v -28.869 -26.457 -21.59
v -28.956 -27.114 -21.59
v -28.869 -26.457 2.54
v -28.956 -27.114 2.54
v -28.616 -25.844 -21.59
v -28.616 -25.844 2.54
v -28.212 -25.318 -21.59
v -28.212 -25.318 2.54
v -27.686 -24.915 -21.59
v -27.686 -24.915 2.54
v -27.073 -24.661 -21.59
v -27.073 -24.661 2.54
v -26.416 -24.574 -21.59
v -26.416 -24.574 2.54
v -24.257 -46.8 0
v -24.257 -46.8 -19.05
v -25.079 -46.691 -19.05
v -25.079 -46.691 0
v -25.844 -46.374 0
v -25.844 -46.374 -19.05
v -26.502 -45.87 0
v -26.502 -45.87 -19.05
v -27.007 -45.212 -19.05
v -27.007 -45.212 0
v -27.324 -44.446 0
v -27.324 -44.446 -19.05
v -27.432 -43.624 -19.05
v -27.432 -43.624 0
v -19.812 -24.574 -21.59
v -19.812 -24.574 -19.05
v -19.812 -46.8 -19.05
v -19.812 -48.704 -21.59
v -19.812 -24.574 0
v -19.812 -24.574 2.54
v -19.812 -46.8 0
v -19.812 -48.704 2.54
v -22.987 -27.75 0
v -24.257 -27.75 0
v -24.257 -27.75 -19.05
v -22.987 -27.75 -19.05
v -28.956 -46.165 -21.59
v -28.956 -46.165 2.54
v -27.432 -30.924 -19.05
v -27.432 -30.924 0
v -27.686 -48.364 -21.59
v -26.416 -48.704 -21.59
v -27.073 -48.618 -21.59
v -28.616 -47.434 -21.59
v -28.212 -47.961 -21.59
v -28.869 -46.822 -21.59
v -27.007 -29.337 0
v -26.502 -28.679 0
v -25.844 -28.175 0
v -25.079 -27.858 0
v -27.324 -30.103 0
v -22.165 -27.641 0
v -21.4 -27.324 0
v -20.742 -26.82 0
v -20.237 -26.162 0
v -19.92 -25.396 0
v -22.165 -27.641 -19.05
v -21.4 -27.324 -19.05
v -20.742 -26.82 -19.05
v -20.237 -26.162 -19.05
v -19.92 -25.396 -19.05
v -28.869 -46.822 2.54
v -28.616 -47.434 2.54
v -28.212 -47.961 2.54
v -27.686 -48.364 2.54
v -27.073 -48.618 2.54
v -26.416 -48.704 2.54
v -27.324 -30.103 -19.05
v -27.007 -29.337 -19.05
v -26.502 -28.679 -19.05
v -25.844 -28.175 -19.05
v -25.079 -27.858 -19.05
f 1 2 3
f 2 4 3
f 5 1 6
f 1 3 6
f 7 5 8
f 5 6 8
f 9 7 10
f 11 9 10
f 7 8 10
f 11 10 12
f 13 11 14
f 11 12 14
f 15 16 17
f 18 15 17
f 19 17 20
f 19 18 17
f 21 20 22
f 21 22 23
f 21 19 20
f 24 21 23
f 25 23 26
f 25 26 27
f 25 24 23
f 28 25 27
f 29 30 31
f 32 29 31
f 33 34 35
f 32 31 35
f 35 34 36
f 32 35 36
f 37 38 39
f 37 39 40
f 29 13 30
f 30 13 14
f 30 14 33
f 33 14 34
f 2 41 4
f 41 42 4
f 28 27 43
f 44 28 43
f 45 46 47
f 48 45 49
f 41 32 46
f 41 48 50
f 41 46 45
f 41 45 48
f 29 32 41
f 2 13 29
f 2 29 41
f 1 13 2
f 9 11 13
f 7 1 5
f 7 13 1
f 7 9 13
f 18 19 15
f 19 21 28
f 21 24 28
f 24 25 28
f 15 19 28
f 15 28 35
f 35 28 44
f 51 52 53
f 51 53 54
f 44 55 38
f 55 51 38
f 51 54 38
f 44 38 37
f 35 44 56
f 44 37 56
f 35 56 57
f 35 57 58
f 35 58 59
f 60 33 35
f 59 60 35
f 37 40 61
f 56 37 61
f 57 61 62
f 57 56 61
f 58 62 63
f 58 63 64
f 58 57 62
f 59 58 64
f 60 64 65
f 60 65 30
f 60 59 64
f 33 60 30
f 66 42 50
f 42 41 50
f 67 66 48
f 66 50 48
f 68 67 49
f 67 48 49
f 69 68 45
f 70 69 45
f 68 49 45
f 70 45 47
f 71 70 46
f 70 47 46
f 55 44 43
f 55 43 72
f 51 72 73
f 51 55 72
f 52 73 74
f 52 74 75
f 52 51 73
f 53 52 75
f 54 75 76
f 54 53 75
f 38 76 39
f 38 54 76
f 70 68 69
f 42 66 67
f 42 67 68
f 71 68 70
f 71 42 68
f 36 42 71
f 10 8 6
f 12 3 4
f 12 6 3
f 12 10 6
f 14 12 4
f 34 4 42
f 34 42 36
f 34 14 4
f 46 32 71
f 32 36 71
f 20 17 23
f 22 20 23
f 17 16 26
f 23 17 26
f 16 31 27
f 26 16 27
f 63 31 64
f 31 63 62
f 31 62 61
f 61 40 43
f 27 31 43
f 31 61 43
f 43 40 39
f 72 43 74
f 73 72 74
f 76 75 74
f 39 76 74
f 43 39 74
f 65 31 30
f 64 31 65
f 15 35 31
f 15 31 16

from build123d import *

# Parameters (mm, degrees)
BOSS_EXTRUDE1_DEPTH = 19.05
BOSS_EXTRUDE2_START = 2.54
BOSS_EXTRUDE2_DEPTH = 2.54
BOSS_EXTRUDE3_DEPTH = 2.54
FILLET1_R           = 2.54


with BuildPart() as part:
    # Sketch1 → Boss-Extrude1 (new body)
    with BuildSketch(Plane.XY):
        with BuildLine():
            ThreePointArc((-22.987, -27.7495), (-20.74193597, -26.81956403), (-19.812, -24.5745))
            Line((-19.812, -24.5745), (-28.956, -24.5745))
            Line((-28.956, -24.5745), (-28.956, -48.7045))
            Line((-28.956, -48.7045), (-19.812, -48.7045))
            Line((-19.812, -48.7045), (-19.812, -46.7995))
            Line((-19.812, -46.7995), (-24.257, -46.7995))
            ThreePointArc((-24.257, -46.7995), (-26.50206403, -45.86956403), (-27.432, -43.6245))
            Line((-27.432, -43.6245), (-27.432, -30.9245))
            ThreePointArc((-27.432, -30.9245), (-26.50206403, -28.67943597), (-24.257, -27.7495))
            Line((-24.257, -27.7495), (-22.987, -27.7495))
        make_face()
    extrude(amount=-BOSS_EXTRUDE1_DEPTH)

    # Sketch2 → Boss-Extrude2 (add)
    with BuildSketch(Plane.XY.offset(BOSS_EXTRUDE2_START)):
        with BuildLine():
            Line((-19.812, -46.7995), (-24.257, -46.7995))
            ThreePointArc((-24.257, -46.7995), (-26.50206403, -45.86956403), (-27.432, -43.6245))
            Line((-27.432, -43.6245), (-27.432, -30.9245))
            ThreePointArc((-27.432, -30.9245), (-26.50206403, -28.67943597), (-24.257, -27.7495))
            Line((-24.257, -27.7495), (-22.987, -27.7495))
            ThreePointArc((-22.987, -27.7495), (-20.74193597, -26.81956403), (-19.812, -24.5745))
            Line((-19.812, -24.5745), (-28.956, -24.5745))
            Line((-28.956, -24.5745), (-28.956, -48.7045))
            Line((-28.956, -48.7045), (-19.812, -48.7045))
            Line((-19.812, -48.7045), (-19.812, -46.7995))
        make_face()
        with BuildLine():
            Line((-19.812, -46.7995), (-19.812, -24.5745))
            ThreePointArc((-19.812, -24.5745), (-20.74193597, -26.81956403), (-22.987, -27.7495))
            Line((-22.987, -27.7495), (-24.257, -27.7495))
            ThreePointArc((-24.257, -27.7495), (-26.50206403, -28.67943597), (-27.432, -30.9245))
            Line((-27.432, -30.9245), (-27.432, -43.6245))
            ThreePointArc((-27.432, -43.6245), (-26.50206403, -45.86956403), (-24.257, -46.7995))
            Line((-24.257, -46.7995), (-19.812, -46.7995))
        make_face()
    extrude(amount=-BOSS_EXTRUDE2_DEPTH)

    # Sketch3 → Boss-Extrude3 (add)
    with BuildSketch(Plane(origin=(0, 0, -19.05), x_dir=(-1, 0, 0), z_dir=(0, 0, -1))):
        with BuildLine():
            ThreePointArc((22.987, -27.7495), (20.74193597, -26.81956403), (19.812, -24.5745))
            Line((19.812, -24.5745), (19.812, -46.7995))
            Line((19.812, -46.7995), (24.257, -46.7995))
            ThreePointArc((24.257, -46.7995), (26.50206403, -45.86956403), (27.432, -43.6245))
            Line((27.432, -43.6245), (27.432, -30.9245))
            ThreePointArc((27.432, -30.9245), (26.50206403, -28.67943597), (24.257, -27.7495))
            Line((24.257, -27.7495), (22.987, -27.7495))
        make_face()
        with BuildLine():
            Line((27.432, -30.9245), (27.432, -43.6245))
            ThreePointArc((27.432, -43.6245), (26.50206403, -45.86956403), (24.257, -46.7995))
            Line((24.257, -46.7995), (19.812, -46.7995))
            Line((19.812, -46.7995), (19.812, -48.7045))
            Line((19.812, -48.7045), (28.956, -48.7045))
            Line((28.956, -48.7045), (28.956, -24.5745))
            Line((28.956, -24.5745), (19.812, -24.5745))
            ThreePointArc((19.812, -24.5745), (20.74193597, -26.81956403), (22.987, -27.7495))
            Line((22.987, -27.7495), (24.257, -27.7495))
            ThreePointArc((24.257, -27.7495), (26.50206403, -28.67943597), (27.432, -30.9245))
        make_face()
    extrude(amount=BOSS_EXTRUDE3_DEPTH)

    # Fillet1
    fillet1_edges = [part.edges().sort_by_distance(p)[0] for p in [
        (-28.956, -48.7045, -9.525),
        (-28.956, -24.5745, -9.525),
    ]]
    fillet(fillet1_edges, radius=FILLET1_R)


solid = part.part
